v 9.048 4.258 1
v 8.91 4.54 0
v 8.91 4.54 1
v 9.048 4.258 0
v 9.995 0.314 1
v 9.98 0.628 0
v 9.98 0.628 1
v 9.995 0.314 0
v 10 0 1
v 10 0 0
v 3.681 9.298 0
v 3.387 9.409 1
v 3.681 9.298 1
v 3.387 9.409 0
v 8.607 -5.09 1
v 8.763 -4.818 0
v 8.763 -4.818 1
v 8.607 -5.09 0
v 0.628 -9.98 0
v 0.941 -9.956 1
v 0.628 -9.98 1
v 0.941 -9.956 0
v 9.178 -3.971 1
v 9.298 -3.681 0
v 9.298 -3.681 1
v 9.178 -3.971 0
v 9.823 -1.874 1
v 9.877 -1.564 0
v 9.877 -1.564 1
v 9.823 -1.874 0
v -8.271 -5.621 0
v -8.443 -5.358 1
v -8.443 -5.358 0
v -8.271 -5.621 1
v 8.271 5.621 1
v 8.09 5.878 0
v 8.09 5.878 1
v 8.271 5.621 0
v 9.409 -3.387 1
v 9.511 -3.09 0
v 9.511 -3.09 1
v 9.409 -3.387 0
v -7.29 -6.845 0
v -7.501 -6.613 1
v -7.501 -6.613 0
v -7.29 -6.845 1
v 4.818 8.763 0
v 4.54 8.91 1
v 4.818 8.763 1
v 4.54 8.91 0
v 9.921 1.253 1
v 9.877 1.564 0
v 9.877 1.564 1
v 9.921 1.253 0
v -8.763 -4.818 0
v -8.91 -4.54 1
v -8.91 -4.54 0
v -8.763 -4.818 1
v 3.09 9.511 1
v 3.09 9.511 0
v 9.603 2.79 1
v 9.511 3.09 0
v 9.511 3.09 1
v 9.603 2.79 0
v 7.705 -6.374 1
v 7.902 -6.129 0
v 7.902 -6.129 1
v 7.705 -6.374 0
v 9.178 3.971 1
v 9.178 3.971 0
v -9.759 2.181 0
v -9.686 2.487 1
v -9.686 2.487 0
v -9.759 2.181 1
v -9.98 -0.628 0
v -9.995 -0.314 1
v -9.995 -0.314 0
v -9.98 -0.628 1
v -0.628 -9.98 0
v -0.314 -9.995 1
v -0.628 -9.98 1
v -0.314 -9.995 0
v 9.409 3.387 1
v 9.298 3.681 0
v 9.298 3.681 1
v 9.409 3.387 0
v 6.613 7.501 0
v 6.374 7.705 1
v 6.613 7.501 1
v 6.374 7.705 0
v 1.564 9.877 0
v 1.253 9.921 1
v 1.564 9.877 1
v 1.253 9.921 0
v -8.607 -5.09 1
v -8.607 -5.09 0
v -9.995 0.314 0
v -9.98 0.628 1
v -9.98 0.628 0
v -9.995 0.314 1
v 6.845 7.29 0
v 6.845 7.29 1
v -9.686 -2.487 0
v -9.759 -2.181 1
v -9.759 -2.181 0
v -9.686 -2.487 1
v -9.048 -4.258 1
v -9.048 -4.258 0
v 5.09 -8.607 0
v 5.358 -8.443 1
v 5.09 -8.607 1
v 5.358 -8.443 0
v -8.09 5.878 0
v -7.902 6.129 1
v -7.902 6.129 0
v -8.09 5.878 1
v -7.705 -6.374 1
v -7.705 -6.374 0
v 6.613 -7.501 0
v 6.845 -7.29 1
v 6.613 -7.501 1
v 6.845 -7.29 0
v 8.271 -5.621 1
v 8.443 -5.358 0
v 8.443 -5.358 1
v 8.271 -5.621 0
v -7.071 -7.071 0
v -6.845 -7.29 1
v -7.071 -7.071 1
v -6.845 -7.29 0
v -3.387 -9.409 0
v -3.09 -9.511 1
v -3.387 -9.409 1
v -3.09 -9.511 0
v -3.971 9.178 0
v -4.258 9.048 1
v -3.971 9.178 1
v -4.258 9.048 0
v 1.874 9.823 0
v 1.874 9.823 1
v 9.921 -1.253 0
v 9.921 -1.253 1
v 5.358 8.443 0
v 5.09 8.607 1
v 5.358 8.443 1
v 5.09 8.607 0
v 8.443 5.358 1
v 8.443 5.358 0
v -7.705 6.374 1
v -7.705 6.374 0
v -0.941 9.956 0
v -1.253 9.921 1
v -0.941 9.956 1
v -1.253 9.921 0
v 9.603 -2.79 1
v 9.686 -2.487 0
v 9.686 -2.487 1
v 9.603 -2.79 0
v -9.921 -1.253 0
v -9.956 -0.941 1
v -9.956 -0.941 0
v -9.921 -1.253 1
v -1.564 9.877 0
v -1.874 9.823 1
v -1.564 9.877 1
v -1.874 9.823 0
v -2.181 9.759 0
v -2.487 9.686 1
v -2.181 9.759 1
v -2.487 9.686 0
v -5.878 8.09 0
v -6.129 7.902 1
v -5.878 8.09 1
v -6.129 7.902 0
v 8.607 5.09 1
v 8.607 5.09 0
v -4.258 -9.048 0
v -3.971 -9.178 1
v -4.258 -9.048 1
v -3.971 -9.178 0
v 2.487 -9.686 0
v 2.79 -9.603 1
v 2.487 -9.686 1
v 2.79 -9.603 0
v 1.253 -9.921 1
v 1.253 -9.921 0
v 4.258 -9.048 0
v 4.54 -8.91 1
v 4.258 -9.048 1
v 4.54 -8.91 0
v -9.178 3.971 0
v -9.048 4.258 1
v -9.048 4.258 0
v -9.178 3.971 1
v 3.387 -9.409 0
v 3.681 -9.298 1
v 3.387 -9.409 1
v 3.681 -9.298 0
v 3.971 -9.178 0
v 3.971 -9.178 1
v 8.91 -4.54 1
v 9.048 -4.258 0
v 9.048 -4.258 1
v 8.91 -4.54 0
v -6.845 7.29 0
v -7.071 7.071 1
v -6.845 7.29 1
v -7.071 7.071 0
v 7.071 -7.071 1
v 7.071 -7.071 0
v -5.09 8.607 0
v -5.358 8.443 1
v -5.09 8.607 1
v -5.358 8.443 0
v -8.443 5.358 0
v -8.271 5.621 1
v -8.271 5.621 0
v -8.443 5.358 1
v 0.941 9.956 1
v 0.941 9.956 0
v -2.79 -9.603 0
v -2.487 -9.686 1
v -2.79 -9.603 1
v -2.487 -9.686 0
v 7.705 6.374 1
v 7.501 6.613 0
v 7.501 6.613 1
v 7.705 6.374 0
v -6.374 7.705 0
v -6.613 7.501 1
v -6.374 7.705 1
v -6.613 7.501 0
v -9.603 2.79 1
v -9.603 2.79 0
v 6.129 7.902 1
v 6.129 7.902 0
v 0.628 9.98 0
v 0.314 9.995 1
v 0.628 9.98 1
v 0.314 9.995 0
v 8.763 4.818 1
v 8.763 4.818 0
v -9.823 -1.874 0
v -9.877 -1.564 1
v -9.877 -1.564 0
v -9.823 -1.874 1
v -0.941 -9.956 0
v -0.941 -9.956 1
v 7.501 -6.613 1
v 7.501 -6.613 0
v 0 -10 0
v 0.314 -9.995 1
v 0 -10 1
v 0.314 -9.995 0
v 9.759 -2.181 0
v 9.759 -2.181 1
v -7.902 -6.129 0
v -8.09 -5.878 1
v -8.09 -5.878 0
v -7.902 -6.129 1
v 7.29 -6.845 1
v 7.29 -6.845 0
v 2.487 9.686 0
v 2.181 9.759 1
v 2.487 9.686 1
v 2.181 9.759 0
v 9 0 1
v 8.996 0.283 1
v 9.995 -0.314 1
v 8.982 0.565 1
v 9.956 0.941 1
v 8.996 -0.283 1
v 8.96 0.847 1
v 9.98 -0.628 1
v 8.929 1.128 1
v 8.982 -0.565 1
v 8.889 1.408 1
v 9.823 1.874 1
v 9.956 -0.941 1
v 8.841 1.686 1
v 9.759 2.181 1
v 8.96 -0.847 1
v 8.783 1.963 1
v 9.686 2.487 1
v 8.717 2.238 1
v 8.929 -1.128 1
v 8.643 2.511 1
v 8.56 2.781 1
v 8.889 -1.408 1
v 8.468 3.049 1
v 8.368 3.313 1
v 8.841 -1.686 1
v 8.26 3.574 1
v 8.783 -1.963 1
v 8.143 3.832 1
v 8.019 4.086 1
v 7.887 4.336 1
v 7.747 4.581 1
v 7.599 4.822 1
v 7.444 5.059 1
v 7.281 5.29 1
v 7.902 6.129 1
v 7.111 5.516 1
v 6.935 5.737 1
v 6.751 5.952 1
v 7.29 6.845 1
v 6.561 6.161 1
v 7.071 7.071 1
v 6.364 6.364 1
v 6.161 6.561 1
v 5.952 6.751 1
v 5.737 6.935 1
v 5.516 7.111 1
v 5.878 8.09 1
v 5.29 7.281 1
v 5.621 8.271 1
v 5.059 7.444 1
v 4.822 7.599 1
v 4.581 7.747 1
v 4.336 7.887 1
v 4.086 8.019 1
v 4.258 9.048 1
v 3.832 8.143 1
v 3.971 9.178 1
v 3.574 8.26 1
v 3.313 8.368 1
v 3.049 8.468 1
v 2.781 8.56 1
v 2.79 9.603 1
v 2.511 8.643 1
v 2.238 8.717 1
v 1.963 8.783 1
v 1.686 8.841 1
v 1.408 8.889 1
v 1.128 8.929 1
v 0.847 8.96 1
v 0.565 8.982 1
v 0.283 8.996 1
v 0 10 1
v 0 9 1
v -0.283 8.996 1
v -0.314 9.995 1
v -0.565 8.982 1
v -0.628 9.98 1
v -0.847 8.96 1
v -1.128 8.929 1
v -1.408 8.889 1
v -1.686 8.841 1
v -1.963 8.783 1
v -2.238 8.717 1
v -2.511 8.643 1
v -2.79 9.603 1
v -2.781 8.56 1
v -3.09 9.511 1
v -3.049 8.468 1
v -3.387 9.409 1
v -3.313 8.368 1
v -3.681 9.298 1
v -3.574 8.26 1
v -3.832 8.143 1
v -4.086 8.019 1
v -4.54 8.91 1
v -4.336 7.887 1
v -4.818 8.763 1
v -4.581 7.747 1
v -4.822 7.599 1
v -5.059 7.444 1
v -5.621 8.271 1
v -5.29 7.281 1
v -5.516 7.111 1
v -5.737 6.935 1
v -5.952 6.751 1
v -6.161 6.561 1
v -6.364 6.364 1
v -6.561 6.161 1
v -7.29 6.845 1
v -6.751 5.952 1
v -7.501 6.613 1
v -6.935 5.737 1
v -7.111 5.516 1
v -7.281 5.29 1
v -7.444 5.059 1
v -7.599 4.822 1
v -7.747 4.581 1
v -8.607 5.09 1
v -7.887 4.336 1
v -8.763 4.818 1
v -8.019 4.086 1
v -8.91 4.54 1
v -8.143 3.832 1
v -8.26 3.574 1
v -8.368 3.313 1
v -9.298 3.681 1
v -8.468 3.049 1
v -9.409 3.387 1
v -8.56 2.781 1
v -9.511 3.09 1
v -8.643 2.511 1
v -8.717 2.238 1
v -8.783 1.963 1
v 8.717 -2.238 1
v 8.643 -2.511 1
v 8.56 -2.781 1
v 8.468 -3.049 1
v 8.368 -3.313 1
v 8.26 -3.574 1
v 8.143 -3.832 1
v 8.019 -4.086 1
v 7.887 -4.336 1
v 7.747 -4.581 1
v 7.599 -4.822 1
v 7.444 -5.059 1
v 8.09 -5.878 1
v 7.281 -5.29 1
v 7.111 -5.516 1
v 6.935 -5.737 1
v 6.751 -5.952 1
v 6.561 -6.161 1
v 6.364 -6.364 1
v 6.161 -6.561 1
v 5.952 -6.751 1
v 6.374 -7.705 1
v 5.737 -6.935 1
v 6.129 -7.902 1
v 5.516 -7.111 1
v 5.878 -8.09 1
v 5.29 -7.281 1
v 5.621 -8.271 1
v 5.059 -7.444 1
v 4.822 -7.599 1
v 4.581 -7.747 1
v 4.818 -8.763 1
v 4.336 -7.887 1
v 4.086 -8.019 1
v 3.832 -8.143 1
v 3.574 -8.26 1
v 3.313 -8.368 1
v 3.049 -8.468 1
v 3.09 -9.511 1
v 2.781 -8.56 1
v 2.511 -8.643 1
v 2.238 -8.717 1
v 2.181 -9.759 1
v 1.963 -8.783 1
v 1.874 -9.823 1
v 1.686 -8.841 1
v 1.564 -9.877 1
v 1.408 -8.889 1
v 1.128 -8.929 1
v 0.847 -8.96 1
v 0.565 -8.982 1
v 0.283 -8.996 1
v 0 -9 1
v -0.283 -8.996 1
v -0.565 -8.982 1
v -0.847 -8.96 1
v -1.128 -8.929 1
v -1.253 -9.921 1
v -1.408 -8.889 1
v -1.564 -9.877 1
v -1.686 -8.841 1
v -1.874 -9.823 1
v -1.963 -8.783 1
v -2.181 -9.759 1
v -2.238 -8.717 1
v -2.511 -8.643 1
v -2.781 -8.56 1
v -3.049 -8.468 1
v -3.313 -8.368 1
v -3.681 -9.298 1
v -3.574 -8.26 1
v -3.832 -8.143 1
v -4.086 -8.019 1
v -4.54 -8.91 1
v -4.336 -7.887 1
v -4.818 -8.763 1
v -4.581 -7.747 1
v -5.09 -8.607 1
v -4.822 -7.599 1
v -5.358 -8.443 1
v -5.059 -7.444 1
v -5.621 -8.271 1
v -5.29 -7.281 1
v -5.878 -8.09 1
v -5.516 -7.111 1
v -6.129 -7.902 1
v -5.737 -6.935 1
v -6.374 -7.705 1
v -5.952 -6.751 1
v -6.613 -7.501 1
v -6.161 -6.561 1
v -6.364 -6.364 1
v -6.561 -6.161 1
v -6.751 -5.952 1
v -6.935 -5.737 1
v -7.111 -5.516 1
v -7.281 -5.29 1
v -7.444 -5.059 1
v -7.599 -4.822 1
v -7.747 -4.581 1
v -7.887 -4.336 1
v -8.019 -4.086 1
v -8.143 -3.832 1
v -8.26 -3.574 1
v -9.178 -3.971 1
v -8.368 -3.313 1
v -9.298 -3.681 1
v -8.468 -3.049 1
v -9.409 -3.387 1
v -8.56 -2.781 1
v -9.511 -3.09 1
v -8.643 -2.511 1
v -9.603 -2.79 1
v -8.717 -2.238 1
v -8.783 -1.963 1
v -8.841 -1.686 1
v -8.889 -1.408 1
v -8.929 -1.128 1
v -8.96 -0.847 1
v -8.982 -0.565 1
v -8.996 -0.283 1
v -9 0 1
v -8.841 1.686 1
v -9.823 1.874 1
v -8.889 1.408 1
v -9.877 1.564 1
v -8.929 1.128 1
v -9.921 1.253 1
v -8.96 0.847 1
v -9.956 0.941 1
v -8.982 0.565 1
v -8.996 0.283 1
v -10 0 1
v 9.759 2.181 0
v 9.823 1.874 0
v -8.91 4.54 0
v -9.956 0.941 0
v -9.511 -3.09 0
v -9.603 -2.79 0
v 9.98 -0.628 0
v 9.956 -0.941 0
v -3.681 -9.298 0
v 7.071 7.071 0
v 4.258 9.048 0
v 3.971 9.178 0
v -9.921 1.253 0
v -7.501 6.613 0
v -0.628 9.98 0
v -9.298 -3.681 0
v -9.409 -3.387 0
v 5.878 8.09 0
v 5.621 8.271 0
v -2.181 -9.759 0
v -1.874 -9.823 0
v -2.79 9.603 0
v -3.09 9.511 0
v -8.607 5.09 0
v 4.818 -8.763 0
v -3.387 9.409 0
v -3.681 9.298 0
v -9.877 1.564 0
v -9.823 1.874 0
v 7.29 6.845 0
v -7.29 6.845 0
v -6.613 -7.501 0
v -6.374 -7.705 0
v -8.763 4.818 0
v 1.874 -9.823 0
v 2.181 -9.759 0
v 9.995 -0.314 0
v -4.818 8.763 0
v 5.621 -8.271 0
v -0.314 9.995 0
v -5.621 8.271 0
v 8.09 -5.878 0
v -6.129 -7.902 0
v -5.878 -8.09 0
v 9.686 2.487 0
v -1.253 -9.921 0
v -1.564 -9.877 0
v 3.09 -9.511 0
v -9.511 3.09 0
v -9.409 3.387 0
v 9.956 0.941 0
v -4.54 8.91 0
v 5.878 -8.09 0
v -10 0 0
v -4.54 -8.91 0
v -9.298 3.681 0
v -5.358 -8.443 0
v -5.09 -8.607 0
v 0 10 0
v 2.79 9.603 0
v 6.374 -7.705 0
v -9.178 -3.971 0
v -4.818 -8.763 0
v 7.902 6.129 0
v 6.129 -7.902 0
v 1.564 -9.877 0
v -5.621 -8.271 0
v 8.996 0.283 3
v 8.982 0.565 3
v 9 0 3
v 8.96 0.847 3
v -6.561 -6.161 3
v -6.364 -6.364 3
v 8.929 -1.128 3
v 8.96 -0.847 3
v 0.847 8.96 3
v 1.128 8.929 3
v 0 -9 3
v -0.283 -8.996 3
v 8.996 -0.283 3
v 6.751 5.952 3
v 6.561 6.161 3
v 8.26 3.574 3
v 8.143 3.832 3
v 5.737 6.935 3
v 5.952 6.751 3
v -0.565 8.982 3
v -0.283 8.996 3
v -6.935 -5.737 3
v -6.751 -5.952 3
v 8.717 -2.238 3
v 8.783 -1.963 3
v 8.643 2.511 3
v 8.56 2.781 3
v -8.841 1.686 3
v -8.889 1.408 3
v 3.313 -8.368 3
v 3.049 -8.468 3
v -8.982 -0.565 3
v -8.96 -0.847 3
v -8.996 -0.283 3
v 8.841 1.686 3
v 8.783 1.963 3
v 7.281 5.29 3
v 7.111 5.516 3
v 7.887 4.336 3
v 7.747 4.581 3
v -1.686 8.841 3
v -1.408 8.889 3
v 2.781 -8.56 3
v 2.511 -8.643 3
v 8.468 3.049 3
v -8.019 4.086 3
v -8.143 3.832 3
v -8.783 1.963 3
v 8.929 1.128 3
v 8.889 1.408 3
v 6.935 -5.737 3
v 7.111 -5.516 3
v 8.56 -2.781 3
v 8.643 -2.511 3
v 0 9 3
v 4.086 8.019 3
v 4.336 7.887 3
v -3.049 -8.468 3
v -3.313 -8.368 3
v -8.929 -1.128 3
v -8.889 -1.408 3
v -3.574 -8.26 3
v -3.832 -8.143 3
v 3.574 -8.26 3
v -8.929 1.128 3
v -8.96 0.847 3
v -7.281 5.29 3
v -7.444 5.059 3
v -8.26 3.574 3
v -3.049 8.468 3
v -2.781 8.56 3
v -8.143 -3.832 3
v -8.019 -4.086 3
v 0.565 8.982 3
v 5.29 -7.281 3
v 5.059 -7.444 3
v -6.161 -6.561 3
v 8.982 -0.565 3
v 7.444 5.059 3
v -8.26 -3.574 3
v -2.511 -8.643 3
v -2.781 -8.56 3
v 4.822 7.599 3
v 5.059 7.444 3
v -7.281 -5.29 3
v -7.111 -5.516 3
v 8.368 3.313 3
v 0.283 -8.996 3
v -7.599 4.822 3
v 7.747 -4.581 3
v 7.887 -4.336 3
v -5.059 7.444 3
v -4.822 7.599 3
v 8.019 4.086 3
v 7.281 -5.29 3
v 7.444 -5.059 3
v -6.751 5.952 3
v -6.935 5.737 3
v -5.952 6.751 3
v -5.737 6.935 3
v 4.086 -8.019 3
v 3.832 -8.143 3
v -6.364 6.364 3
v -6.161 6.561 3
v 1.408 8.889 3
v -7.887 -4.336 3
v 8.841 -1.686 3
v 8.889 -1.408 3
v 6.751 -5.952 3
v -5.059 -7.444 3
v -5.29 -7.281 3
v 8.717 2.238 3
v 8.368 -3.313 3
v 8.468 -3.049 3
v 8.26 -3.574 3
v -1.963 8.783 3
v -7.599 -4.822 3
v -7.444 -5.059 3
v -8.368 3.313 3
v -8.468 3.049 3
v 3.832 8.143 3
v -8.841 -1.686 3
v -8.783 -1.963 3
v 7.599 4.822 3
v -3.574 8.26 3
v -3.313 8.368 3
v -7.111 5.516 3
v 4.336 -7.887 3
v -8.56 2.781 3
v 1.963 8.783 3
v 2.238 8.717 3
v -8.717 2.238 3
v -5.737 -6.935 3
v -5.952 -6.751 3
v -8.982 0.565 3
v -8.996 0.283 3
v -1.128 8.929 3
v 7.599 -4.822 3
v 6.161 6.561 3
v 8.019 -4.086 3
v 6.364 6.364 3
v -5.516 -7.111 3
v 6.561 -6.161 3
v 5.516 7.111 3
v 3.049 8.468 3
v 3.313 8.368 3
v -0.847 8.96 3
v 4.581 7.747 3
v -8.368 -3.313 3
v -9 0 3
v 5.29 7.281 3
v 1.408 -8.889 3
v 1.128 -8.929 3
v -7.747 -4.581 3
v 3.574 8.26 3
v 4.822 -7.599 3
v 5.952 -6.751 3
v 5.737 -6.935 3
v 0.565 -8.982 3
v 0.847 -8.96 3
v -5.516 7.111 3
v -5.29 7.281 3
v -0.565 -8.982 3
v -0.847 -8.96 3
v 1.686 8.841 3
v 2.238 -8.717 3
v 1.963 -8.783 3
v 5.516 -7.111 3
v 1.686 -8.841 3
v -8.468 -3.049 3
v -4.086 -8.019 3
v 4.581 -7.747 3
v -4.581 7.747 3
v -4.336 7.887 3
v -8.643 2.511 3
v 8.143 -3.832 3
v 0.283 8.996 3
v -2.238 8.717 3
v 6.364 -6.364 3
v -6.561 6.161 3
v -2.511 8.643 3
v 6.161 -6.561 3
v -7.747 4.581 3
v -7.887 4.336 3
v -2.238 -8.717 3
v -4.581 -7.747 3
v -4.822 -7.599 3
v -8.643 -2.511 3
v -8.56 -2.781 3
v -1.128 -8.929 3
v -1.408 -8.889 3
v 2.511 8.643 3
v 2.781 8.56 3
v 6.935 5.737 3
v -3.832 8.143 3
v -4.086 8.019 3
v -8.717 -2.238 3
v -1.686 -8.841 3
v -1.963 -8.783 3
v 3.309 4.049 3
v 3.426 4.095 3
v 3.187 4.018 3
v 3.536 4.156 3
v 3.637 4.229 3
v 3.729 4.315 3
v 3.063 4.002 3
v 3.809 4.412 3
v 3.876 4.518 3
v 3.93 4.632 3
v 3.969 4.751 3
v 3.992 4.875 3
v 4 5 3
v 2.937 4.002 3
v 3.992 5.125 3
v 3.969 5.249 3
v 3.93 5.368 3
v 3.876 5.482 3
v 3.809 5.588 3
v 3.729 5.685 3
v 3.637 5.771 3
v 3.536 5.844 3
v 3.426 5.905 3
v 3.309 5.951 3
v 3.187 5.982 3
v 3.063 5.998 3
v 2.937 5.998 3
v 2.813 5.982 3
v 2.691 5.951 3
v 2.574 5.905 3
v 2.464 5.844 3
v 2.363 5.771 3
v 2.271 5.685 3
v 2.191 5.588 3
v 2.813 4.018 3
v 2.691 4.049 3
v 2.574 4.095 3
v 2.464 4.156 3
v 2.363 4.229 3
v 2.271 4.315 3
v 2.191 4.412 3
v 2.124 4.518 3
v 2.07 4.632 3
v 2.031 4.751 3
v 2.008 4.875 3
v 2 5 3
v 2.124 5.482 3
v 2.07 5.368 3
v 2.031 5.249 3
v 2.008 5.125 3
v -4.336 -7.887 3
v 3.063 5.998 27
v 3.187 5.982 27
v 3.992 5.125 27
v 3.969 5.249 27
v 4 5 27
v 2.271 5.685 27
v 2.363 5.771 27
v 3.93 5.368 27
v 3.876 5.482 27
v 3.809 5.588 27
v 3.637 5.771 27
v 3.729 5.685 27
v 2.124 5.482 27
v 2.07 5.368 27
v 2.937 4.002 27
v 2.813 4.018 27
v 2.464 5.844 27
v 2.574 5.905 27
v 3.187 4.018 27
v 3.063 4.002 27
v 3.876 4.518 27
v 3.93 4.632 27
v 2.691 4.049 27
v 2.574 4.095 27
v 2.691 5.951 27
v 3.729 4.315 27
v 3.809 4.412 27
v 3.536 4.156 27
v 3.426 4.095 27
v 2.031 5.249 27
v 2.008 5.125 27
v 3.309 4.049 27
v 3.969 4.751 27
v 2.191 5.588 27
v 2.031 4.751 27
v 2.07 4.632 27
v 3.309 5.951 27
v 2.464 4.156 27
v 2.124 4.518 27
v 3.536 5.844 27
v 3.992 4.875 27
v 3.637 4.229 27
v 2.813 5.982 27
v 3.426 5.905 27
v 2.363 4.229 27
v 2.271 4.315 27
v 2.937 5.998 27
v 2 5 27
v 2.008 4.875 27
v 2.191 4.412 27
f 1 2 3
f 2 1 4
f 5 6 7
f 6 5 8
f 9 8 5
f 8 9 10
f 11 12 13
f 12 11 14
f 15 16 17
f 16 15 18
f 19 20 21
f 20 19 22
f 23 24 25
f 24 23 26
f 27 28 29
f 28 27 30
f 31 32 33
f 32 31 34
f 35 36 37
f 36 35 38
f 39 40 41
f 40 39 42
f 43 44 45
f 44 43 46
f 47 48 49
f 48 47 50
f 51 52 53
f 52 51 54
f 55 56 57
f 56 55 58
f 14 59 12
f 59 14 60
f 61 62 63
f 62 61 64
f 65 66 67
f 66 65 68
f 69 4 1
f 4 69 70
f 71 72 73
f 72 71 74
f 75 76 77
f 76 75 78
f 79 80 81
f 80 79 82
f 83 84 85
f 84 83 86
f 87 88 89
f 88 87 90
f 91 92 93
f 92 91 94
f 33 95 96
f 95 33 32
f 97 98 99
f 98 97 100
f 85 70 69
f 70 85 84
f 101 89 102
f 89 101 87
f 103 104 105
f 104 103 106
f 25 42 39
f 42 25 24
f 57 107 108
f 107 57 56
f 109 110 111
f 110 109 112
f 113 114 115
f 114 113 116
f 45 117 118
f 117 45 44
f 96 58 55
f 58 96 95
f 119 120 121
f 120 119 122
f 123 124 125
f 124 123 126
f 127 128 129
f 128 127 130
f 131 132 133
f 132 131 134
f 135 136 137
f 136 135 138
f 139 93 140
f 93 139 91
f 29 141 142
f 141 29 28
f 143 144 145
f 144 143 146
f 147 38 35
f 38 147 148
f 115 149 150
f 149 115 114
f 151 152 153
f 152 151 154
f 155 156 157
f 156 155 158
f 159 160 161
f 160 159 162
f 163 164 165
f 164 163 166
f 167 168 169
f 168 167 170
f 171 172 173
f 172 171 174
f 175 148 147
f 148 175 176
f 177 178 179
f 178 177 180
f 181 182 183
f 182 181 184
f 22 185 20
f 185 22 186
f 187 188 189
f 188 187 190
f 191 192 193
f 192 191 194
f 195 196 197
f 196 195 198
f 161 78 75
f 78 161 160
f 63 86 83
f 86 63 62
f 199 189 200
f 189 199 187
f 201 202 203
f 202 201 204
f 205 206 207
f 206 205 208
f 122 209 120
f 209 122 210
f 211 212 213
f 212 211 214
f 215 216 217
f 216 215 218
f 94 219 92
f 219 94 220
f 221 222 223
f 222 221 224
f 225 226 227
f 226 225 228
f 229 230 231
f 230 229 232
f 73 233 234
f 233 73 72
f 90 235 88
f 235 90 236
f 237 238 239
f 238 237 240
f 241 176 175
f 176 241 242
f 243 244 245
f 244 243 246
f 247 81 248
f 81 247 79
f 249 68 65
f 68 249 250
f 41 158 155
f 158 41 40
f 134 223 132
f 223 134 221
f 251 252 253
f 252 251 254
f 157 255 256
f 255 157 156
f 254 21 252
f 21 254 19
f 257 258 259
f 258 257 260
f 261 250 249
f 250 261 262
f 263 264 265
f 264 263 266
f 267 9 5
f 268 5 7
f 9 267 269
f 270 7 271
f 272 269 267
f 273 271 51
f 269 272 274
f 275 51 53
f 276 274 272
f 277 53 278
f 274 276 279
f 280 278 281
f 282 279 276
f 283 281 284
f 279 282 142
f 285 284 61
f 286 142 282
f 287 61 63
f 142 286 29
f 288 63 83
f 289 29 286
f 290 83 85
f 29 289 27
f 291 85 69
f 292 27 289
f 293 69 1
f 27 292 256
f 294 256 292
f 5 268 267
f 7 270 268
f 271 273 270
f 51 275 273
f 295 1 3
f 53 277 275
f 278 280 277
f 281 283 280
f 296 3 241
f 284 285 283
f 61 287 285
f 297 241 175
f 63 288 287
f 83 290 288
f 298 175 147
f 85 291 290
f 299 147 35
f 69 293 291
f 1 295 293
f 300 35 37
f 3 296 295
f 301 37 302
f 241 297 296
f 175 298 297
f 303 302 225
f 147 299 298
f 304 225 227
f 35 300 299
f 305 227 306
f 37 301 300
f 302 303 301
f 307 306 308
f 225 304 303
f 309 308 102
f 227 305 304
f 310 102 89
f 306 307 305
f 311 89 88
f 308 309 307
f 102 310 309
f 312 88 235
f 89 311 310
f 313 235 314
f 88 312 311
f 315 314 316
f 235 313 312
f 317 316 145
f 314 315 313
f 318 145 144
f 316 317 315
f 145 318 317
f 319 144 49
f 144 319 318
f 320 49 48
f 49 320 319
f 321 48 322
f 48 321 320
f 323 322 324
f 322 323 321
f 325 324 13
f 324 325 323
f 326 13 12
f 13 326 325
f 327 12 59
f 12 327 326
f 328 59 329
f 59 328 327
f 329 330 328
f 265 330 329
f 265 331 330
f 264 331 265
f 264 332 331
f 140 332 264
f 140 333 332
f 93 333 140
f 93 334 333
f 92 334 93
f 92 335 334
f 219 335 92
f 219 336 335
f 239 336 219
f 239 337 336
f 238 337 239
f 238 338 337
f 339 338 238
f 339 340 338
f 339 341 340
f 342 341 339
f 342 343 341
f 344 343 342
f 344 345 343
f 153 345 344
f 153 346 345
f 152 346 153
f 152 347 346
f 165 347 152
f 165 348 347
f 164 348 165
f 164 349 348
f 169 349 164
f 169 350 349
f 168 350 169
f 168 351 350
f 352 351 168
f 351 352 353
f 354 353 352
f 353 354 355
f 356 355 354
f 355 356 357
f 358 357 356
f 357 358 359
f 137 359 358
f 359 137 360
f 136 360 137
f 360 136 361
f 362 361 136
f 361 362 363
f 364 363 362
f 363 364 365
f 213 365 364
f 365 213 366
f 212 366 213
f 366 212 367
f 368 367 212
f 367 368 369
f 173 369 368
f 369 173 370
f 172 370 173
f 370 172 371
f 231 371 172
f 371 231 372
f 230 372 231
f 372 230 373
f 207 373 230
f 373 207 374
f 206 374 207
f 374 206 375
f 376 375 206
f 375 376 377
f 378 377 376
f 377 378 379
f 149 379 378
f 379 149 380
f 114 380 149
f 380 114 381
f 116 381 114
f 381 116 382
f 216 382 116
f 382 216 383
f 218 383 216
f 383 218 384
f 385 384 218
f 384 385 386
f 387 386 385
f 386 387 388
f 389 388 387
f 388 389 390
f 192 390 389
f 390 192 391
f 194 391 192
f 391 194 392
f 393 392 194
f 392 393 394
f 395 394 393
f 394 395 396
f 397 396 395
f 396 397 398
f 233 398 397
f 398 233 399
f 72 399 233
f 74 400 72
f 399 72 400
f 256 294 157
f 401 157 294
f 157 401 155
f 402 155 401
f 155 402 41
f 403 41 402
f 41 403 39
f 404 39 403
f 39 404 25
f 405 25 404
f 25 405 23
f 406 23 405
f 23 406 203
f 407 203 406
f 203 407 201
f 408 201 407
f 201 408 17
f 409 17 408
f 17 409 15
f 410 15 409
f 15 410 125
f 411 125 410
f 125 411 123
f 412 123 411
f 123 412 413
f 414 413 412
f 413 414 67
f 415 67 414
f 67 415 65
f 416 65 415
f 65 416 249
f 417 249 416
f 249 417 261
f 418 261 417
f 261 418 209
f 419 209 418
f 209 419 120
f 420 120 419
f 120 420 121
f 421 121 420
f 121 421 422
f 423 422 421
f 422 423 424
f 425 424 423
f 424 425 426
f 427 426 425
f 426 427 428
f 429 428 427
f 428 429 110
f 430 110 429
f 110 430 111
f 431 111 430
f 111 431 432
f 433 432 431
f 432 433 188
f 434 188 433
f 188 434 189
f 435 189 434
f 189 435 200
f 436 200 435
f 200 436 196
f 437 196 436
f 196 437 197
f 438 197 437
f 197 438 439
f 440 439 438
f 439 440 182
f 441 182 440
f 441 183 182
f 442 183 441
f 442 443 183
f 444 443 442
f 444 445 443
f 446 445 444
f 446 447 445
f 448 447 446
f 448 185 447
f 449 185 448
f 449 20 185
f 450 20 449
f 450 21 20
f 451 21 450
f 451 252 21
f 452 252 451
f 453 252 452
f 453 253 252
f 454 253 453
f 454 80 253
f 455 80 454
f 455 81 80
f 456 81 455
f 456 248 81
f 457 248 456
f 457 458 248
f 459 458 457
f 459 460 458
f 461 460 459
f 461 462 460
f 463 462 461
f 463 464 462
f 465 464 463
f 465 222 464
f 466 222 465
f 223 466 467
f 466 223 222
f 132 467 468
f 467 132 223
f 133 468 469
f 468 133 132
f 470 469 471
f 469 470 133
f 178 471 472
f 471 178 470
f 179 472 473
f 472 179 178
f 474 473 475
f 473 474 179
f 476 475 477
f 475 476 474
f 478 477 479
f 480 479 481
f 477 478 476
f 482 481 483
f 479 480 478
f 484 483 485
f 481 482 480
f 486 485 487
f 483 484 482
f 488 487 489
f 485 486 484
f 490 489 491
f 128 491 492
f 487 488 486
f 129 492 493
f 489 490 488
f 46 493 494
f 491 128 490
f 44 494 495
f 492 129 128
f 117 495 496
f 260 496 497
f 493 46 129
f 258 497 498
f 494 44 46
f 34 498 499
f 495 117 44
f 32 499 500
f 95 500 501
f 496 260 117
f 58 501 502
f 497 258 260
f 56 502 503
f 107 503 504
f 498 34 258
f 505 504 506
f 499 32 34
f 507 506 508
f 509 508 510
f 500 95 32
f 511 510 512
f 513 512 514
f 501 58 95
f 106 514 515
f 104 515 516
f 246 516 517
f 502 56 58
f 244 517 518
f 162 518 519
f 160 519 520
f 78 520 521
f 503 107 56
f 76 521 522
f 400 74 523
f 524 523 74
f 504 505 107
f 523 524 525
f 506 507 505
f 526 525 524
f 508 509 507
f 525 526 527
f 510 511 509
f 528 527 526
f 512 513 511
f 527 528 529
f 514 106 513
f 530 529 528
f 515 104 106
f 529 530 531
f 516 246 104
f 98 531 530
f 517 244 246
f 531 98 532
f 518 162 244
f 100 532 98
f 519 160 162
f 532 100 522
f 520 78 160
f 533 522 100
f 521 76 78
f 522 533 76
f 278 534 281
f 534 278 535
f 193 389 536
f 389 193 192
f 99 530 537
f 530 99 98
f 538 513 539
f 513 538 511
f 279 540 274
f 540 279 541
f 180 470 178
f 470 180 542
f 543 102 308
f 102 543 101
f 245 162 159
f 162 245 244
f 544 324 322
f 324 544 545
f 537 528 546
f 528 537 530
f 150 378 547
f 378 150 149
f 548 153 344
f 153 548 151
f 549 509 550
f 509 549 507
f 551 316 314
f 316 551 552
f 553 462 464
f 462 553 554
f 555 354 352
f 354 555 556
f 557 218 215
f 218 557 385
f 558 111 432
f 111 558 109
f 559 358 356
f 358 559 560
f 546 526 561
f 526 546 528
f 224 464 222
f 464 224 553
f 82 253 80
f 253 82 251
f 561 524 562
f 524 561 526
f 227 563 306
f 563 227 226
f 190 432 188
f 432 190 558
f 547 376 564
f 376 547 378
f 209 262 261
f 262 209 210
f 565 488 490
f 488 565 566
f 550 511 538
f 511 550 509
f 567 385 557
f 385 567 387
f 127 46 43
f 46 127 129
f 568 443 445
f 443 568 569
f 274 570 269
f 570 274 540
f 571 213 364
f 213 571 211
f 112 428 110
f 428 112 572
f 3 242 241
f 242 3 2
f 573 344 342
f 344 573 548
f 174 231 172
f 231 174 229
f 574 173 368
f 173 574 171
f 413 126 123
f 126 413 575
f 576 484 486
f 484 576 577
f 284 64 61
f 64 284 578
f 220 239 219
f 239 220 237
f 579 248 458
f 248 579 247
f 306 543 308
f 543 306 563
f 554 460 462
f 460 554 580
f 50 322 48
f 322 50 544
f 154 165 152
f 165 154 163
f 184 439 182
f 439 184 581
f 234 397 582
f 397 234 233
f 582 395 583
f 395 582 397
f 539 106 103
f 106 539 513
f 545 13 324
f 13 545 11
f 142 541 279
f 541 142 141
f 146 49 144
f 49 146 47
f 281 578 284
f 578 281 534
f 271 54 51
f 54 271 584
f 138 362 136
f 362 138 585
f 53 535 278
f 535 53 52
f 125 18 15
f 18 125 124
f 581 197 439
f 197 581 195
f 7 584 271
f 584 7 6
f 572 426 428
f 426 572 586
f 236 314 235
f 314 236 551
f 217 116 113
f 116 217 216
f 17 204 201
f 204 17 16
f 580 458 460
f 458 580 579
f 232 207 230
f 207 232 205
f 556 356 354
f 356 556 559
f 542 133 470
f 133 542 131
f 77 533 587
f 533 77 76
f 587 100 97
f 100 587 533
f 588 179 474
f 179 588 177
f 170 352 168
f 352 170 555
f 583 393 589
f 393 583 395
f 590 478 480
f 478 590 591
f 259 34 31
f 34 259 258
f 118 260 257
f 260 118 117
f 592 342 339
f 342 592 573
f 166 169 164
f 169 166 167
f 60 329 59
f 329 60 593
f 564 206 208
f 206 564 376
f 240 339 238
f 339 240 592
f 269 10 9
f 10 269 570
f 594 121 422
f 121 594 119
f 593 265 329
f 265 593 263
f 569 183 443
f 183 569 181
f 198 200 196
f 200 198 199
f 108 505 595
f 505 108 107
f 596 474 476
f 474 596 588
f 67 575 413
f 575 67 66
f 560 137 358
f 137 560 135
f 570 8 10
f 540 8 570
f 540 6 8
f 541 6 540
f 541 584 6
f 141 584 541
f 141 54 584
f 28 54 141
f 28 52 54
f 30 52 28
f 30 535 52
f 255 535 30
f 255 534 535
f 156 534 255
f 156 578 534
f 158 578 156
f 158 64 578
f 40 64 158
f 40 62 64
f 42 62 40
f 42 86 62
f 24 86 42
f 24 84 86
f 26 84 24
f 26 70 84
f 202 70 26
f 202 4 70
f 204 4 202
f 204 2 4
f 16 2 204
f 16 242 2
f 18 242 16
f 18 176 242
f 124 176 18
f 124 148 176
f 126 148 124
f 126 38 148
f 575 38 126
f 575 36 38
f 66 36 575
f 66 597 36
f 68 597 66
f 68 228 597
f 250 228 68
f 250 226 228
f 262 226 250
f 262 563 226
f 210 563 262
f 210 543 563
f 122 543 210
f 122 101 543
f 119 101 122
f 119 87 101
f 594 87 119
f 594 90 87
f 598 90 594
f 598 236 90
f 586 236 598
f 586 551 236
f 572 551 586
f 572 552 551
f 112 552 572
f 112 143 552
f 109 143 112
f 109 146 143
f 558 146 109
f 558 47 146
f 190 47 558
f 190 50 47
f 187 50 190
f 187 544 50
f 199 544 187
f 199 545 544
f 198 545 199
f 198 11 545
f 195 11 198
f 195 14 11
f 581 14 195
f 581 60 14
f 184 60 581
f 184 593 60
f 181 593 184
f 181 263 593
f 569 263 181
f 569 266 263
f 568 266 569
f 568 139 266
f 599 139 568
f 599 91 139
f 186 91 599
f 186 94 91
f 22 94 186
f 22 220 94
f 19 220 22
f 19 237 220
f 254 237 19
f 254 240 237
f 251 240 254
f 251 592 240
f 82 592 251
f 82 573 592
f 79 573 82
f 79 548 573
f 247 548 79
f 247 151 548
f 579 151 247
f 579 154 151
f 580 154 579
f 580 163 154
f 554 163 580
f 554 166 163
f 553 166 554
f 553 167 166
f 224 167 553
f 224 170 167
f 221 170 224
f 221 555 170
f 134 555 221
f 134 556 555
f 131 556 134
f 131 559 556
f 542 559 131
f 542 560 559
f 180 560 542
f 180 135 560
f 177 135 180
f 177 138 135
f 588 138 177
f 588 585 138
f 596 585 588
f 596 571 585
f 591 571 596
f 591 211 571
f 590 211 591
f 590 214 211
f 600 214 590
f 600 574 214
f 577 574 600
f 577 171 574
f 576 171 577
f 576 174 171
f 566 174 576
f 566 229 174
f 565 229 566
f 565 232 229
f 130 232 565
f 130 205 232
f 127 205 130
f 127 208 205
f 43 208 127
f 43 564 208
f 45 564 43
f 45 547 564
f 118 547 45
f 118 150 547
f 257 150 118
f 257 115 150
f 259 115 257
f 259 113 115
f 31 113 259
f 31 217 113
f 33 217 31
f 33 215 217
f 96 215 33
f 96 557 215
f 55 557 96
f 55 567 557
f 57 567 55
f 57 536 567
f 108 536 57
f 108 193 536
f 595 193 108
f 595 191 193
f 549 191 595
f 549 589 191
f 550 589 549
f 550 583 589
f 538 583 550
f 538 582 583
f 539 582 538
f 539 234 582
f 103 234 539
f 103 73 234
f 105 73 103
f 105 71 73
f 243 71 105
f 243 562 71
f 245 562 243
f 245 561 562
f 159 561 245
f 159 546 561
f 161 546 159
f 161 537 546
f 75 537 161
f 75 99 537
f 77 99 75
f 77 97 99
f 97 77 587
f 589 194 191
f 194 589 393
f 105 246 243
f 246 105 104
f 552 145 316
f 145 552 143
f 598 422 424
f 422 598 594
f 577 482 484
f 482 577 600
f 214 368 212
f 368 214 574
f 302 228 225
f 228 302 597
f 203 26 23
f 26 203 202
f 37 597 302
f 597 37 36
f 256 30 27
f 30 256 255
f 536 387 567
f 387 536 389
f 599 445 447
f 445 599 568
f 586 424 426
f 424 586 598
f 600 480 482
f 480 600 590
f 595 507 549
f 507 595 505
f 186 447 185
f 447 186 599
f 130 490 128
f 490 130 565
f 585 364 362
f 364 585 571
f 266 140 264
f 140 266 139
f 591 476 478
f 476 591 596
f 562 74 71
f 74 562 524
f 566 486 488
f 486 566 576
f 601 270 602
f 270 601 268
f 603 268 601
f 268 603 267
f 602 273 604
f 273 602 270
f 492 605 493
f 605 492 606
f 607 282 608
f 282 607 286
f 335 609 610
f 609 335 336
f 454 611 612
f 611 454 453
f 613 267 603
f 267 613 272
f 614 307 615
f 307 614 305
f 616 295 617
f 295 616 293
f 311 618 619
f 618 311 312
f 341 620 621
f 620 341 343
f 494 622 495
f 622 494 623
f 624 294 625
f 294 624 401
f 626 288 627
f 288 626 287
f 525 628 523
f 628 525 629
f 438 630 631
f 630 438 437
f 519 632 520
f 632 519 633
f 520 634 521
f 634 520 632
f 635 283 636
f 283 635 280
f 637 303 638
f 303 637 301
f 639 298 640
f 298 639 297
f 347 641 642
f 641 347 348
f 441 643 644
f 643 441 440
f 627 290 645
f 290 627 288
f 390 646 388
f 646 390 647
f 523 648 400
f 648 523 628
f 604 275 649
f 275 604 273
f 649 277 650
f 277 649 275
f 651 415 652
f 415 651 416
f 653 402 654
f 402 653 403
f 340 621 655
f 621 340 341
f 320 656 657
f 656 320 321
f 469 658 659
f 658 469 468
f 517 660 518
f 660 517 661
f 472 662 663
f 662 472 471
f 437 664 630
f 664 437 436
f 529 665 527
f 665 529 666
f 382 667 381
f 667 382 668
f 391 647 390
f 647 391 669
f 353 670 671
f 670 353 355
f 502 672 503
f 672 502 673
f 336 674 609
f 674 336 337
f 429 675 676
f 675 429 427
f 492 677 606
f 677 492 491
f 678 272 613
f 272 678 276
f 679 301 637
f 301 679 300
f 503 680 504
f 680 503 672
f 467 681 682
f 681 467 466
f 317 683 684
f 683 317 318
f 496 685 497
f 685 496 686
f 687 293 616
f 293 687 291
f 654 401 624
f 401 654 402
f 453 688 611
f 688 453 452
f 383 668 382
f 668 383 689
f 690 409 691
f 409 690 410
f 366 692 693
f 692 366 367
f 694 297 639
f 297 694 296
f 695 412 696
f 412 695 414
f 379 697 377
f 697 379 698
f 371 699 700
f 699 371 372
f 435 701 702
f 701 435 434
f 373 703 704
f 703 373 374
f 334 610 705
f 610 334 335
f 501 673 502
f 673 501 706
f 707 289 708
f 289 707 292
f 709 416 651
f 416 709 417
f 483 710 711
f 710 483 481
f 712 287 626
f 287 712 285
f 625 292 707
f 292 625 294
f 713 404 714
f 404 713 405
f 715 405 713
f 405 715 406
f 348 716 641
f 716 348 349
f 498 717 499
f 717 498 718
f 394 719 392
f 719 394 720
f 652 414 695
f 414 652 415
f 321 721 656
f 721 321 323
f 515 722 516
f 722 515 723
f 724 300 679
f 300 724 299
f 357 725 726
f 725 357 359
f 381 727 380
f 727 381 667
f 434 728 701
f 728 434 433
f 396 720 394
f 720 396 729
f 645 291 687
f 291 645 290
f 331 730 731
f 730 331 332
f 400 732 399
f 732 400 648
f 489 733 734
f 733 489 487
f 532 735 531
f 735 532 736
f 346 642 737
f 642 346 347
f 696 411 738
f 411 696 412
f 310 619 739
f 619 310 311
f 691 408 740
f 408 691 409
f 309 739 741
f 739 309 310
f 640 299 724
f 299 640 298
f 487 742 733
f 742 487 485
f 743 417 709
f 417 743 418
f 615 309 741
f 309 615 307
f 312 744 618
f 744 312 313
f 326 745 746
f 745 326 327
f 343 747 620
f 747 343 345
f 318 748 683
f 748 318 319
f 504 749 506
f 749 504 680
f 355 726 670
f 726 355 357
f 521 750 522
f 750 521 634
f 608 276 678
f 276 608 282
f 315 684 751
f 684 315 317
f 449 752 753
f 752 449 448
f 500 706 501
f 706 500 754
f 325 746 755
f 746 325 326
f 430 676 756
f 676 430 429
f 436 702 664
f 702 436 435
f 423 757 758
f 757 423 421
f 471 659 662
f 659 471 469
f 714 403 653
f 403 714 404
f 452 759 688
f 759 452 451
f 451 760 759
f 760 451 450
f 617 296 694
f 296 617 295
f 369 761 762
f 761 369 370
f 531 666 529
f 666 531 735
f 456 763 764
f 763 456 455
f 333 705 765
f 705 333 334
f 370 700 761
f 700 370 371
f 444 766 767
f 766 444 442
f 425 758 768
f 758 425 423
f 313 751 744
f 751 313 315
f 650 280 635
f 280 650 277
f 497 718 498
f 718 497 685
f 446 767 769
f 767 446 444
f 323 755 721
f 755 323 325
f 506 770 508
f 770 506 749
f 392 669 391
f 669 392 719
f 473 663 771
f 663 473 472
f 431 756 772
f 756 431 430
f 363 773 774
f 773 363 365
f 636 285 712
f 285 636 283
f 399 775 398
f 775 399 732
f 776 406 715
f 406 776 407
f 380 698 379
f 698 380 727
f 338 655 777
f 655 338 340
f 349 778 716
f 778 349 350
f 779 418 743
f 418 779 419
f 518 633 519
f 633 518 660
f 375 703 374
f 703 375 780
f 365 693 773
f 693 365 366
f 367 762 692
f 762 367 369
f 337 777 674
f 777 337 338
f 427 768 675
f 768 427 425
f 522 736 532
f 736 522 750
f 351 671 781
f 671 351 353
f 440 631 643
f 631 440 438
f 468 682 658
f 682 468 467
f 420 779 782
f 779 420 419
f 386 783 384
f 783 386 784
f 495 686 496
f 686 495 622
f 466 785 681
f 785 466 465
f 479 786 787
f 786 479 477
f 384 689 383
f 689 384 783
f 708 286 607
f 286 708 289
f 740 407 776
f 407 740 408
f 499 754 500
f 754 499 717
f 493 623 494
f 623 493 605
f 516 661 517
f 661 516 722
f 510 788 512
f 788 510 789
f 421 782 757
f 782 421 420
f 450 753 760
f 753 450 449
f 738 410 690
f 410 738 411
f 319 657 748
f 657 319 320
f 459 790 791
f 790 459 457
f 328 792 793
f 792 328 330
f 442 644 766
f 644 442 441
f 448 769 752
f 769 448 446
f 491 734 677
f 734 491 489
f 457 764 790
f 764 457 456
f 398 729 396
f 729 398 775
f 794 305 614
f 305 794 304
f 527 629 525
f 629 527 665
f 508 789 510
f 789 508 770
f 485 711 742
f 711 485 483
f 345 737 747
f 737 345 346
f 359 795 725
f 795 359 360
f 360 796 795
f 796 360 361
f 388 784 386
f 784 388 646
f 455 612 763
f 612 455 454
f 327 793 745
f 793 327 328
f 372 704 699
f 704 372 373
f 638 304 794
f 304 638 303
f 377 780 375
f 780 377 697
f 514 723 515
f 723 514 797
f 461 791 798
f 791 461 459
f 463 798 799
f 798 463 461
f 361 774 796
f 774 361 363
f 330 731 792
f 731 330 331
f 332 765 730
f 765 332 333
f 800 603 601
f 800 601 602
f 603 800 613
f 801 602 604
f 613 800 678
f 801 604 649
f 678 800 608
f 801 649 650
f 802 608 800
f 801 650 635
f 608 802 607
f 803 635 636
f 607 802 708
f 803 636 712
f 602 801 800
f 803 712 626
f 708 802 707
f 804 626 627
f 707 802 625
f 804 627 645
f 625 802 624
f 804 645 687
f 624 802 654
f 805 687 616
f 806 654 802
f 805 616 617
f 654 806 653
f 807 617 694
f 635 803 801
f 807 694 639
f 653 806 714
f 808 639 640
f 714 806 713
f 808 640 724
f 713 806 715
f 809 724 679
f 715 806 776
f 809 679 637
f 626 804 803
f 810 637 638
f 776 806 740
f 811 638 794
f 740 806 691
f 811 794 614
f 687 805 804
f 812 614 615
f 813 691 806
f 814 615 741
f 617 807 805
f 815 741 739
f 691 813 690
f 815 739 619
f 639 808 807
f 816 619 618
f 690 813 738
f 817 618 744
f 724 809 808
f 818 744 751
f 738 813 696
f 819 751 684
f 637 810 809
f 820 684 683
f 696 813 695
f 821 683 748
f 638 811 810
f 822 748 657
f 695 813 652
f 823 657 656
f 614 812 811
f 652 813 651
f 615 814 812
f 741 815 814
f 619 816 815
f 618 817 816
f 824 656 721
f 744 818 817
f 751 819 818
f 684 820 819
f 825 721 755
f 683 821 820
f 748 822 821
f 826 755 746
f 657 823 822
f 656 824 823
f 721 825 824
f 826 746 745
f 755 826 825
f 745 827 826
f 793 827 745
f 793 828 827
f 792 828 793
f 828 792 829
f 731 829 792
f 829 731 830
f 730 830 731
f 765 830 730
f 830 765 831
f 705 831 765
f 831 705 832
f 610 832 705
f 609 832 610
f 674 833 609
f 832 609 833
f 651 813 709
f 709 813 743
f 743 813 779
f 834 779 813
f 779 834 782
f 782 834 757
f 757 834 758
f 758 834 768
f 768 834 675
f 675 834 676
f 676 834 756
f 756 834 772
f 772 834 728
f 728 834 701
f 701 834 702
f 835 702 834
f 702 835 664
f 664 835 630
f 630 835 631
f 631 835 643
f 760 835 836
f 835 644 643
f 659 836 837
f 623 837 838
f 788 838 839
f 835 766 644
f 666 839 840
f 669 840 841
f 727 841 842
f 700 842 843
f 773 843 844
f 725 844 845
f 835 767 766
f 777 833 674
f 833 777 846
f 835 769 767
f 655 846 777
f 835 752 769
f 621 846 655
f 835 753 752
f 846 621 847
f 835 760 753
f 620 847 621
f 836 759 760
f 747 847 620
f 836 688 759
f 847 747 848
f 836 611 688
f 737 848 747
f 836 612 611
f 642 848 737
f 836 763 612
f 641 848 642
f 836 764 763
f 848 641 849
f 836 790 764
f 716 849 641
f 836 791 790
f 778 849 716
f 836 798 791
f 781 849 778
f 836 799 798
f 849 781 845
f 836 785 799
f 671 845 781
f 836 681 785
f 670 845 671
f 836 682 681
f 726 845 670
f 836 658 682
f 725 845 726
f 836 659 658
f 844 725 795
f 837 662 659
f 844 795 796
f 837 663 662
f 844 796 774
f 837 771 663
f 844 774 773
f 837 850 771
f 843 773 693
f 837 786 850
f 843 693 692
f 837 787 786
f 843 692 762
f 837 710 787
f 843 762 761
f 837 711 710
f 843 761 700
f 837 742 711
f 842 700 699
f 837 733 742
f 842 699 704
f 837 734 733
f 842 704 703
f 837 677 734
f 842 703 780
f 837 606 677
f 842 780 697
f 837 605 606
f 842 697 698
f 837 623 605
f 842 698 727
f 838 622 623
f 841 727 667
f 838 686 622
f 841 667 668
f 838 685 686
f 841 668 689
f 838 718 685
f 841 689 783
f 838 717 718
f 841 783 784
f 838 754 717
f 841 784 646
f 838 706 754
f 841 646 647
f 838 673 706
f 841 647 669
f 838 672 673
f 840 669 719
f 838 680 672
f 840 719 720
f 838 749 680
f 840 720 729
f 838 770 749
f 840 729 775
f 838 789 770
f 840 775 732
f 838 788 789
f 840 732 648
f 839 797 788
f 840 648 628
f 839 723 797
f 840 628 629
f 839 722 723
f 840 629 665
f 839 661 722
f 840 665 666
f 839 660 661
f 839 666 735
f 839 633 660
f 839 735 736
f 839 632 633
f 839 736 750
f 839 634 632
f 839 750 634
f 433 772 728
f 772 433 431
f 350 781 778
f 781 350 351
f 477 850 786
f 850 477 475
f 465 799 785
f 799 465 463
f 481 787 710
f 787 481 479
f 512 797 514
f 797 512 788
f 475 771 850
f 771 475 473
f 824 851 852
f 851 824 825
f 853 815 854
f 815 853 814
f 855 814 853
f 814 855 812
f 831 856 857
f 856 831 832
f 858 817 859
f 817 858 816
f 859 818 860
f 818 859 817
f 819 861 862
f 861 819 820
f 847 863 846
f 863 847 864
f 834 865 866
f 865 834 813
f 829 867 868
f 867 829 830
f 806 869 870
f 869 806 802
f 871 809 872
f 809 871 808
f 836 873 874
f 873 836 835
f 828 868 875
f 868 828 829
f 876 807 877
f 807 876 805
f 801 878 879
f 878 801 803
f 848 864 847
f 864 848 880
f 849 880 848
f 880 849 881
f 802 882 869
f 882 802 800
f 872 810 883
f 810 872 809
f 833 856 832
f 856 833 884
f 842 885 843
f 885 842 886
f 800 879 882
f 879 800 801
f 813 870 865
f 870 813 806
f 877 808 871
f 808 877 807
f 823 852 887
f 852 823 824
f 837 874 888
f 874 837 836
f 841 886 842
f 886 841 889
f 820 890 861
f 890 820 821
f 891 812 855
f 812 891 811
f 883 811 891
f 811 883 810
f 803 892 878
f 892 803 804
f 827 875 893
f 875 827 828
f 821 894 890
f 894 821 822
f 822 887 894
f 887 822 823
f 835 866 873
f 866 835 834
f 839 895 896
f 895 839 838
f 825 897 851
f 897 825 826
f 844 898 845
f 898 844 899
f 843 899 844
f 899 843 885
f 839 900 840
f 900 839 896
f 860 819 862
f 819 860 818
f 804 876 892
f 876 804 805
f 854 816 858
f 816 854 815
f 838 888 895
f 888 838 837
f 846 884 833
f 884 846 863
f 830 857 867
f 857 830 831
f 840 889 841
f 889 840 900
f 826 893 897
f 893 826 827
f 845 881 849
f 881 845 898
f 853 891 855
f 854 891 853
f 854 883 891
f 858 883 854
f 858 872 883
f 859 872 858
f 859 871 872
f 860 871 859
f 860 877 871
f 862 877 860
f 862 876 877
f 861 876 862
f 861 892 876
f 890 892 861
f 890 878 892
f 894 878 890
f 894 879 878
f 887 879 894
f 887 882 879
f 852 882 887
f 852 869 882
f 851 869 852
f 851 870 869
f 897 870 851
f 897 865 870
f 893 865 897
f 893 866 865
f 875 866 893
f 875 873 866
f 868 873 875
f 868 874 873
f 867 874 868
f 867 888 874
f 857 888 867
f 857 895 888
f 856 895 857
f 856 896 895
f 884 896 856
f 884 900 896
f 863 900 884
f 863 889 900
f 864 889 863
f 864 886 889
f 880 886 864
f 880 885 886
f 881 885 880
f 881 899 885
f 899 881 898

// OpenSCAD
    // Nume proiect > Proiect_Lab1
module baza_veioza(raza1, grosime1, grosime2)                   // Crearea bazei veiozei
{
    color("green") cylinder (r=raza1, h=grosime1); 
    color("yellow") 
        translate ([0,0,grosime1])
            cylinder (r=raza1-1, h=grosime2);
}
module picior_veioza(grosime, inaltime)                         // Crearea piciorului veiozei
{
    color ("blue") 
        cylinder (r=grosime, h=inaltime); 
           
}










// Apelare module create
baza_veioza(10,1,2,$fn=200);                                    // Apelare baza_veioza
translate ([3,5,2]) picior_veioza(1,25,$fn=50);                 // Apelare picior_veioza
